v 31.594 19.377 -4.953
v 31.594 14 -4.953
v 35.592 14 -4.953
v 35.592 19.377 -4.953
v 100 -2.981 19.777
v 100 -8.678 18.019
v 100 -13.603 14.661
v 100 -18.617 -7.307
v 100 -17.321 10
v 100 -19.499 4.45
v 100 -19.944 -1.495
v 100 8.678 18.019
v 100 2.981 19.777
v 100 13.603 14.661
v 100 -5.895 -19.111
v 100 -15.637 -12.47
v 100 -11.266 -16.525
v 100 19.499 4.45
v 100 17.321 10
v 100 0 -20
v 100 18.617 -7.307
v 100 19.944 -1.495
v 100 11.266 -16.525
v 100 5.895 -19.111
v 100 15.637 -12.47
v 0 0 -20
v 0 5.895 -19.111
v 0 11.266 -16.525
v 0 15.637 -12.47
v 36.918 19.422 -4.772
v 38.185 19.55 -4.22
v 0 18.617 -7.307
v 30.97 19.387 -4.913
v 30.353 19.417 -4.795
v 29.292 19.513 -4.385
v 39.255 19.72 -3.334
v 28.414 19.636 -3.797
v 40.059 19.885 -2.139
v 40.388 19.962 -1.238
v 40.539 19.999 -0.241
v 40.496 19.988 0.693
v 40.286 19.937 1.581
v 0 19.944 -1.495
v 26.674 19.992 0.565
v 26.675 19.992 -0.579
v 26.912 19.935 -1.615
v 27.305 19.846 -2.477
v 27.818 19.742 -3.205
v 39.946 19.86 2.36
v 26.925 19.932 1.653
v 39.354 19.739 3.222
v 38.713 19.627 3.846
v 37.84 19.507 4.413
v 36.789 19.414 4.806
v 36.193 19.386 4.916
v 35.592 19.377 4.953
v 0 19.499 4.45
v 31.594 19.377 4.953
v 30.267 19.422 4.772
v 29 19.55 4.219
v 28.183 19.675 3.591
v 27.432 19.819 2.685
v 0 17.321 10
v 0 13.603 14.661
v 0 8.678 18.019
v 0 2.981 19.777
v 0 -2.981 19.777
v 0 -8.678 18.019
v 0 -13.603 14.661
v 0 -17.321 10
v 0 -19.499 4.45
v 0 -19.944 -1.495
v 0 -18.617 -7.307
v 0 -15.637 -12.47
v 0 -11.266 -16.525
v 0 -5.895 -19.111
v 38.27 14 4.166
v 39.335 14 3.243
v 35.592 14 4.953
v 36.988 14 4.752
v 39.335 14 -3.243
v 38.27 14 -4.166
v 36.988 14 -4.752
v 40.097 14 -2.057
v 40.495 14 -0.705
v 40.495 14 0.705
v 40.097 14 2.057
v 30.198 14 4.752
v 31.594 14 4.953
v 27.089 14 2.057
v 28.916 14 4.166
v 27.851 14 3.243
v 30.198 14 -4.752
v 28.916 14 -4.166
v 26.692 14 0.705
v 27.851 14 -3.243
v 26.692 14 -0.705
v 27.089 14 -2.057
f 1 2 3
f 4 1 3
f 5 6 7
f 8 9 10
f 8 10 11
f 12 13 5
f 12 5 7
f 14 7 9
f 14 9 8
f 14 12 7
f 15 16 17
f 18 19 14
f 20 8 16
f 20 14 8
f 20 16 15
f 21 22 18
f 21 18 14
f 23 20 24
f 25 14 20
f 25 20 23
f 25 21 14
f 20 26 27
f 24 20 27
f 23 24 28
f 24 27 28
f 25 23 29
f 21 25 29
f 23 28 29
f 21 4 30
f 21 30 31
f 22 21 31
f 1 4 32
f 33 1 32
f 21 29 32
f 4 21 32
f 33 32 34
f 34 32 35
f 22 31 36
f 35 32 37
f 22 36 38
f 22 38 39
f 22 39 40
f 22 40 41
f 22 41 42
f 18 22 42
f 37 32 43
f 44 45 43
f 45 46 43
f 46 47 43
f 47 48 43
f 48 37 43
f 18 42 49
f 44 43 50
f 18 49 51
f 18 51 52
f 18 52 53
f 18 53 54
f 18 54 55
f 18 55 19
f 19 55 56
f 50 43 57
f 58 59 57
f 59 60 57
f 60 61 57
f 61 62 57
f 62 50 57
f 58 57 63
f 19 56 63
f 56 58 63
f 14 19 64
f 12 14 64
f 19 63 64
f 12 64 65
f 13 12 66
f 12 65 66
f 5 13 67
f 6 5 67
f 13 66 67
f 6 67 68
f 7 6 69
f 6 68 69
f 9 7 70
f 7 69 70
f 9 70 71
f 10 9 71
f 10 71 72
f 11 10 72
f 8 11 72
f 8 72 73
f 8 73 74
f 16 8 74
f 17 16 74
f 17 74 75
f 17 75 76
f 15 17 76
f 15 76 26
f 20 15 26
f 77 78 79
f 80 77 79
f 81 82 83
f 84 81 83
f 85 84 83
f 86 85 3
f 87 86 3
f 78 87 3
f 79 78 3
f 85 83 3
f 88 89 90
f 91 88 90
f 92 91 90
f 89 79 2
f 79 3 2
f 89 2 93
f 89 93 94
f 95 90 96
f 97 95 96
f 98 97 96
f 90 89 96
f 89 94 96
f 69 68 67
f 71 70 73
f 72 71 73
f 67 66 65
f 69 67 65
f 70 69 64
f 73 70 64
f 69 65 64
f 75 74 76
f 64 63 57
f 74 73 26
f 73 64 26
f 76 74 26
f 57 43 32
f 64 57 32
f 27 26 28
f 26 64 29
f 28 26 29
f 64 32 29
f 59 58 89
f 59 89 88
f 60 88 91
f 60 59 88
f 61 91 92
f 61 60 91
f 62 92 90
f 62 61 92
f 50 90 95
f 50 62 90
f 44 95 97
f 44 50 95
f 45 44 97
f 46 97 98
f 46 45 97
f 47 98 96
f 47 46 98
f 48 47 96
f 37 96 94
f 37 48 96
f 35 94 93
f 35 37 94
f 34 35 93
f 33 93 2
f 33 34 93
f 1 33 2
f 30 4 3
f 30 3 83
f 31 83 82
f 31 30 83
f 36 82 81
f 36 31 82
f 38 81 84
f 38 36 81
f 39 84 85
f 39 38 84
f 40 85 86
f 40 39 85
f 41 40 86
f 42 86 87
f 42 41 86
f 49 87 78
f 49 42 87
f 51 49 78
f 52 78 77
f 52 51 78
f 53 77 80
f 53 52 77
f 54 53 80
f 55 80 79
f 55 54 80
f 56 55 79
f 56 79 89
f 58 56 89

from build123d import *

# Parameters (mm, degrees)
SKICA1_R        = 20
VYSUNOUT1_DEPTH = 100
VYSUNOUT2_START = 20
VYSUNOUT2_DEPTH = 6


with BuildPart() as part:
    # Skica1 → Vysunout1 (new body)
    with BuildSketch(Plane(origin=(0, 0, 0), x_dir=(0, 0, -1), z_dir=(1, 0, 0))):
        Circle(SKICA1_R)
    extrude(amount=VYSUNOUT1_DEPTH)

    # Skica2 → Vysunout2 (cut)
    with BuildSketch(Plane(origin=(0, 0, 0), x_dir=(1, 0, 0), z_dir=(0, 1, 0)).offset(VYSUNOUT2_START)):
        with BuildLine():
            Line((31.593763982, 4.952572563), (35.592424808, 4.952572563))
            ThreePointArc((35.592424808, 4.952572563), (40.544997371, 0), (35.592424808, -4.952572563))
            Line((35.592424808, -4.952572563), (31.593763982, -4.952572563))
            ThreePointArc((31.593763982, -4.952572563), (26.64119142, 0), (31.593763982, 4.952572563))
        make_face()
    extrude(amount=-VYSUNOUT2_DEPTH, mode=Mode.SUBTRACT)


solid = part.part
